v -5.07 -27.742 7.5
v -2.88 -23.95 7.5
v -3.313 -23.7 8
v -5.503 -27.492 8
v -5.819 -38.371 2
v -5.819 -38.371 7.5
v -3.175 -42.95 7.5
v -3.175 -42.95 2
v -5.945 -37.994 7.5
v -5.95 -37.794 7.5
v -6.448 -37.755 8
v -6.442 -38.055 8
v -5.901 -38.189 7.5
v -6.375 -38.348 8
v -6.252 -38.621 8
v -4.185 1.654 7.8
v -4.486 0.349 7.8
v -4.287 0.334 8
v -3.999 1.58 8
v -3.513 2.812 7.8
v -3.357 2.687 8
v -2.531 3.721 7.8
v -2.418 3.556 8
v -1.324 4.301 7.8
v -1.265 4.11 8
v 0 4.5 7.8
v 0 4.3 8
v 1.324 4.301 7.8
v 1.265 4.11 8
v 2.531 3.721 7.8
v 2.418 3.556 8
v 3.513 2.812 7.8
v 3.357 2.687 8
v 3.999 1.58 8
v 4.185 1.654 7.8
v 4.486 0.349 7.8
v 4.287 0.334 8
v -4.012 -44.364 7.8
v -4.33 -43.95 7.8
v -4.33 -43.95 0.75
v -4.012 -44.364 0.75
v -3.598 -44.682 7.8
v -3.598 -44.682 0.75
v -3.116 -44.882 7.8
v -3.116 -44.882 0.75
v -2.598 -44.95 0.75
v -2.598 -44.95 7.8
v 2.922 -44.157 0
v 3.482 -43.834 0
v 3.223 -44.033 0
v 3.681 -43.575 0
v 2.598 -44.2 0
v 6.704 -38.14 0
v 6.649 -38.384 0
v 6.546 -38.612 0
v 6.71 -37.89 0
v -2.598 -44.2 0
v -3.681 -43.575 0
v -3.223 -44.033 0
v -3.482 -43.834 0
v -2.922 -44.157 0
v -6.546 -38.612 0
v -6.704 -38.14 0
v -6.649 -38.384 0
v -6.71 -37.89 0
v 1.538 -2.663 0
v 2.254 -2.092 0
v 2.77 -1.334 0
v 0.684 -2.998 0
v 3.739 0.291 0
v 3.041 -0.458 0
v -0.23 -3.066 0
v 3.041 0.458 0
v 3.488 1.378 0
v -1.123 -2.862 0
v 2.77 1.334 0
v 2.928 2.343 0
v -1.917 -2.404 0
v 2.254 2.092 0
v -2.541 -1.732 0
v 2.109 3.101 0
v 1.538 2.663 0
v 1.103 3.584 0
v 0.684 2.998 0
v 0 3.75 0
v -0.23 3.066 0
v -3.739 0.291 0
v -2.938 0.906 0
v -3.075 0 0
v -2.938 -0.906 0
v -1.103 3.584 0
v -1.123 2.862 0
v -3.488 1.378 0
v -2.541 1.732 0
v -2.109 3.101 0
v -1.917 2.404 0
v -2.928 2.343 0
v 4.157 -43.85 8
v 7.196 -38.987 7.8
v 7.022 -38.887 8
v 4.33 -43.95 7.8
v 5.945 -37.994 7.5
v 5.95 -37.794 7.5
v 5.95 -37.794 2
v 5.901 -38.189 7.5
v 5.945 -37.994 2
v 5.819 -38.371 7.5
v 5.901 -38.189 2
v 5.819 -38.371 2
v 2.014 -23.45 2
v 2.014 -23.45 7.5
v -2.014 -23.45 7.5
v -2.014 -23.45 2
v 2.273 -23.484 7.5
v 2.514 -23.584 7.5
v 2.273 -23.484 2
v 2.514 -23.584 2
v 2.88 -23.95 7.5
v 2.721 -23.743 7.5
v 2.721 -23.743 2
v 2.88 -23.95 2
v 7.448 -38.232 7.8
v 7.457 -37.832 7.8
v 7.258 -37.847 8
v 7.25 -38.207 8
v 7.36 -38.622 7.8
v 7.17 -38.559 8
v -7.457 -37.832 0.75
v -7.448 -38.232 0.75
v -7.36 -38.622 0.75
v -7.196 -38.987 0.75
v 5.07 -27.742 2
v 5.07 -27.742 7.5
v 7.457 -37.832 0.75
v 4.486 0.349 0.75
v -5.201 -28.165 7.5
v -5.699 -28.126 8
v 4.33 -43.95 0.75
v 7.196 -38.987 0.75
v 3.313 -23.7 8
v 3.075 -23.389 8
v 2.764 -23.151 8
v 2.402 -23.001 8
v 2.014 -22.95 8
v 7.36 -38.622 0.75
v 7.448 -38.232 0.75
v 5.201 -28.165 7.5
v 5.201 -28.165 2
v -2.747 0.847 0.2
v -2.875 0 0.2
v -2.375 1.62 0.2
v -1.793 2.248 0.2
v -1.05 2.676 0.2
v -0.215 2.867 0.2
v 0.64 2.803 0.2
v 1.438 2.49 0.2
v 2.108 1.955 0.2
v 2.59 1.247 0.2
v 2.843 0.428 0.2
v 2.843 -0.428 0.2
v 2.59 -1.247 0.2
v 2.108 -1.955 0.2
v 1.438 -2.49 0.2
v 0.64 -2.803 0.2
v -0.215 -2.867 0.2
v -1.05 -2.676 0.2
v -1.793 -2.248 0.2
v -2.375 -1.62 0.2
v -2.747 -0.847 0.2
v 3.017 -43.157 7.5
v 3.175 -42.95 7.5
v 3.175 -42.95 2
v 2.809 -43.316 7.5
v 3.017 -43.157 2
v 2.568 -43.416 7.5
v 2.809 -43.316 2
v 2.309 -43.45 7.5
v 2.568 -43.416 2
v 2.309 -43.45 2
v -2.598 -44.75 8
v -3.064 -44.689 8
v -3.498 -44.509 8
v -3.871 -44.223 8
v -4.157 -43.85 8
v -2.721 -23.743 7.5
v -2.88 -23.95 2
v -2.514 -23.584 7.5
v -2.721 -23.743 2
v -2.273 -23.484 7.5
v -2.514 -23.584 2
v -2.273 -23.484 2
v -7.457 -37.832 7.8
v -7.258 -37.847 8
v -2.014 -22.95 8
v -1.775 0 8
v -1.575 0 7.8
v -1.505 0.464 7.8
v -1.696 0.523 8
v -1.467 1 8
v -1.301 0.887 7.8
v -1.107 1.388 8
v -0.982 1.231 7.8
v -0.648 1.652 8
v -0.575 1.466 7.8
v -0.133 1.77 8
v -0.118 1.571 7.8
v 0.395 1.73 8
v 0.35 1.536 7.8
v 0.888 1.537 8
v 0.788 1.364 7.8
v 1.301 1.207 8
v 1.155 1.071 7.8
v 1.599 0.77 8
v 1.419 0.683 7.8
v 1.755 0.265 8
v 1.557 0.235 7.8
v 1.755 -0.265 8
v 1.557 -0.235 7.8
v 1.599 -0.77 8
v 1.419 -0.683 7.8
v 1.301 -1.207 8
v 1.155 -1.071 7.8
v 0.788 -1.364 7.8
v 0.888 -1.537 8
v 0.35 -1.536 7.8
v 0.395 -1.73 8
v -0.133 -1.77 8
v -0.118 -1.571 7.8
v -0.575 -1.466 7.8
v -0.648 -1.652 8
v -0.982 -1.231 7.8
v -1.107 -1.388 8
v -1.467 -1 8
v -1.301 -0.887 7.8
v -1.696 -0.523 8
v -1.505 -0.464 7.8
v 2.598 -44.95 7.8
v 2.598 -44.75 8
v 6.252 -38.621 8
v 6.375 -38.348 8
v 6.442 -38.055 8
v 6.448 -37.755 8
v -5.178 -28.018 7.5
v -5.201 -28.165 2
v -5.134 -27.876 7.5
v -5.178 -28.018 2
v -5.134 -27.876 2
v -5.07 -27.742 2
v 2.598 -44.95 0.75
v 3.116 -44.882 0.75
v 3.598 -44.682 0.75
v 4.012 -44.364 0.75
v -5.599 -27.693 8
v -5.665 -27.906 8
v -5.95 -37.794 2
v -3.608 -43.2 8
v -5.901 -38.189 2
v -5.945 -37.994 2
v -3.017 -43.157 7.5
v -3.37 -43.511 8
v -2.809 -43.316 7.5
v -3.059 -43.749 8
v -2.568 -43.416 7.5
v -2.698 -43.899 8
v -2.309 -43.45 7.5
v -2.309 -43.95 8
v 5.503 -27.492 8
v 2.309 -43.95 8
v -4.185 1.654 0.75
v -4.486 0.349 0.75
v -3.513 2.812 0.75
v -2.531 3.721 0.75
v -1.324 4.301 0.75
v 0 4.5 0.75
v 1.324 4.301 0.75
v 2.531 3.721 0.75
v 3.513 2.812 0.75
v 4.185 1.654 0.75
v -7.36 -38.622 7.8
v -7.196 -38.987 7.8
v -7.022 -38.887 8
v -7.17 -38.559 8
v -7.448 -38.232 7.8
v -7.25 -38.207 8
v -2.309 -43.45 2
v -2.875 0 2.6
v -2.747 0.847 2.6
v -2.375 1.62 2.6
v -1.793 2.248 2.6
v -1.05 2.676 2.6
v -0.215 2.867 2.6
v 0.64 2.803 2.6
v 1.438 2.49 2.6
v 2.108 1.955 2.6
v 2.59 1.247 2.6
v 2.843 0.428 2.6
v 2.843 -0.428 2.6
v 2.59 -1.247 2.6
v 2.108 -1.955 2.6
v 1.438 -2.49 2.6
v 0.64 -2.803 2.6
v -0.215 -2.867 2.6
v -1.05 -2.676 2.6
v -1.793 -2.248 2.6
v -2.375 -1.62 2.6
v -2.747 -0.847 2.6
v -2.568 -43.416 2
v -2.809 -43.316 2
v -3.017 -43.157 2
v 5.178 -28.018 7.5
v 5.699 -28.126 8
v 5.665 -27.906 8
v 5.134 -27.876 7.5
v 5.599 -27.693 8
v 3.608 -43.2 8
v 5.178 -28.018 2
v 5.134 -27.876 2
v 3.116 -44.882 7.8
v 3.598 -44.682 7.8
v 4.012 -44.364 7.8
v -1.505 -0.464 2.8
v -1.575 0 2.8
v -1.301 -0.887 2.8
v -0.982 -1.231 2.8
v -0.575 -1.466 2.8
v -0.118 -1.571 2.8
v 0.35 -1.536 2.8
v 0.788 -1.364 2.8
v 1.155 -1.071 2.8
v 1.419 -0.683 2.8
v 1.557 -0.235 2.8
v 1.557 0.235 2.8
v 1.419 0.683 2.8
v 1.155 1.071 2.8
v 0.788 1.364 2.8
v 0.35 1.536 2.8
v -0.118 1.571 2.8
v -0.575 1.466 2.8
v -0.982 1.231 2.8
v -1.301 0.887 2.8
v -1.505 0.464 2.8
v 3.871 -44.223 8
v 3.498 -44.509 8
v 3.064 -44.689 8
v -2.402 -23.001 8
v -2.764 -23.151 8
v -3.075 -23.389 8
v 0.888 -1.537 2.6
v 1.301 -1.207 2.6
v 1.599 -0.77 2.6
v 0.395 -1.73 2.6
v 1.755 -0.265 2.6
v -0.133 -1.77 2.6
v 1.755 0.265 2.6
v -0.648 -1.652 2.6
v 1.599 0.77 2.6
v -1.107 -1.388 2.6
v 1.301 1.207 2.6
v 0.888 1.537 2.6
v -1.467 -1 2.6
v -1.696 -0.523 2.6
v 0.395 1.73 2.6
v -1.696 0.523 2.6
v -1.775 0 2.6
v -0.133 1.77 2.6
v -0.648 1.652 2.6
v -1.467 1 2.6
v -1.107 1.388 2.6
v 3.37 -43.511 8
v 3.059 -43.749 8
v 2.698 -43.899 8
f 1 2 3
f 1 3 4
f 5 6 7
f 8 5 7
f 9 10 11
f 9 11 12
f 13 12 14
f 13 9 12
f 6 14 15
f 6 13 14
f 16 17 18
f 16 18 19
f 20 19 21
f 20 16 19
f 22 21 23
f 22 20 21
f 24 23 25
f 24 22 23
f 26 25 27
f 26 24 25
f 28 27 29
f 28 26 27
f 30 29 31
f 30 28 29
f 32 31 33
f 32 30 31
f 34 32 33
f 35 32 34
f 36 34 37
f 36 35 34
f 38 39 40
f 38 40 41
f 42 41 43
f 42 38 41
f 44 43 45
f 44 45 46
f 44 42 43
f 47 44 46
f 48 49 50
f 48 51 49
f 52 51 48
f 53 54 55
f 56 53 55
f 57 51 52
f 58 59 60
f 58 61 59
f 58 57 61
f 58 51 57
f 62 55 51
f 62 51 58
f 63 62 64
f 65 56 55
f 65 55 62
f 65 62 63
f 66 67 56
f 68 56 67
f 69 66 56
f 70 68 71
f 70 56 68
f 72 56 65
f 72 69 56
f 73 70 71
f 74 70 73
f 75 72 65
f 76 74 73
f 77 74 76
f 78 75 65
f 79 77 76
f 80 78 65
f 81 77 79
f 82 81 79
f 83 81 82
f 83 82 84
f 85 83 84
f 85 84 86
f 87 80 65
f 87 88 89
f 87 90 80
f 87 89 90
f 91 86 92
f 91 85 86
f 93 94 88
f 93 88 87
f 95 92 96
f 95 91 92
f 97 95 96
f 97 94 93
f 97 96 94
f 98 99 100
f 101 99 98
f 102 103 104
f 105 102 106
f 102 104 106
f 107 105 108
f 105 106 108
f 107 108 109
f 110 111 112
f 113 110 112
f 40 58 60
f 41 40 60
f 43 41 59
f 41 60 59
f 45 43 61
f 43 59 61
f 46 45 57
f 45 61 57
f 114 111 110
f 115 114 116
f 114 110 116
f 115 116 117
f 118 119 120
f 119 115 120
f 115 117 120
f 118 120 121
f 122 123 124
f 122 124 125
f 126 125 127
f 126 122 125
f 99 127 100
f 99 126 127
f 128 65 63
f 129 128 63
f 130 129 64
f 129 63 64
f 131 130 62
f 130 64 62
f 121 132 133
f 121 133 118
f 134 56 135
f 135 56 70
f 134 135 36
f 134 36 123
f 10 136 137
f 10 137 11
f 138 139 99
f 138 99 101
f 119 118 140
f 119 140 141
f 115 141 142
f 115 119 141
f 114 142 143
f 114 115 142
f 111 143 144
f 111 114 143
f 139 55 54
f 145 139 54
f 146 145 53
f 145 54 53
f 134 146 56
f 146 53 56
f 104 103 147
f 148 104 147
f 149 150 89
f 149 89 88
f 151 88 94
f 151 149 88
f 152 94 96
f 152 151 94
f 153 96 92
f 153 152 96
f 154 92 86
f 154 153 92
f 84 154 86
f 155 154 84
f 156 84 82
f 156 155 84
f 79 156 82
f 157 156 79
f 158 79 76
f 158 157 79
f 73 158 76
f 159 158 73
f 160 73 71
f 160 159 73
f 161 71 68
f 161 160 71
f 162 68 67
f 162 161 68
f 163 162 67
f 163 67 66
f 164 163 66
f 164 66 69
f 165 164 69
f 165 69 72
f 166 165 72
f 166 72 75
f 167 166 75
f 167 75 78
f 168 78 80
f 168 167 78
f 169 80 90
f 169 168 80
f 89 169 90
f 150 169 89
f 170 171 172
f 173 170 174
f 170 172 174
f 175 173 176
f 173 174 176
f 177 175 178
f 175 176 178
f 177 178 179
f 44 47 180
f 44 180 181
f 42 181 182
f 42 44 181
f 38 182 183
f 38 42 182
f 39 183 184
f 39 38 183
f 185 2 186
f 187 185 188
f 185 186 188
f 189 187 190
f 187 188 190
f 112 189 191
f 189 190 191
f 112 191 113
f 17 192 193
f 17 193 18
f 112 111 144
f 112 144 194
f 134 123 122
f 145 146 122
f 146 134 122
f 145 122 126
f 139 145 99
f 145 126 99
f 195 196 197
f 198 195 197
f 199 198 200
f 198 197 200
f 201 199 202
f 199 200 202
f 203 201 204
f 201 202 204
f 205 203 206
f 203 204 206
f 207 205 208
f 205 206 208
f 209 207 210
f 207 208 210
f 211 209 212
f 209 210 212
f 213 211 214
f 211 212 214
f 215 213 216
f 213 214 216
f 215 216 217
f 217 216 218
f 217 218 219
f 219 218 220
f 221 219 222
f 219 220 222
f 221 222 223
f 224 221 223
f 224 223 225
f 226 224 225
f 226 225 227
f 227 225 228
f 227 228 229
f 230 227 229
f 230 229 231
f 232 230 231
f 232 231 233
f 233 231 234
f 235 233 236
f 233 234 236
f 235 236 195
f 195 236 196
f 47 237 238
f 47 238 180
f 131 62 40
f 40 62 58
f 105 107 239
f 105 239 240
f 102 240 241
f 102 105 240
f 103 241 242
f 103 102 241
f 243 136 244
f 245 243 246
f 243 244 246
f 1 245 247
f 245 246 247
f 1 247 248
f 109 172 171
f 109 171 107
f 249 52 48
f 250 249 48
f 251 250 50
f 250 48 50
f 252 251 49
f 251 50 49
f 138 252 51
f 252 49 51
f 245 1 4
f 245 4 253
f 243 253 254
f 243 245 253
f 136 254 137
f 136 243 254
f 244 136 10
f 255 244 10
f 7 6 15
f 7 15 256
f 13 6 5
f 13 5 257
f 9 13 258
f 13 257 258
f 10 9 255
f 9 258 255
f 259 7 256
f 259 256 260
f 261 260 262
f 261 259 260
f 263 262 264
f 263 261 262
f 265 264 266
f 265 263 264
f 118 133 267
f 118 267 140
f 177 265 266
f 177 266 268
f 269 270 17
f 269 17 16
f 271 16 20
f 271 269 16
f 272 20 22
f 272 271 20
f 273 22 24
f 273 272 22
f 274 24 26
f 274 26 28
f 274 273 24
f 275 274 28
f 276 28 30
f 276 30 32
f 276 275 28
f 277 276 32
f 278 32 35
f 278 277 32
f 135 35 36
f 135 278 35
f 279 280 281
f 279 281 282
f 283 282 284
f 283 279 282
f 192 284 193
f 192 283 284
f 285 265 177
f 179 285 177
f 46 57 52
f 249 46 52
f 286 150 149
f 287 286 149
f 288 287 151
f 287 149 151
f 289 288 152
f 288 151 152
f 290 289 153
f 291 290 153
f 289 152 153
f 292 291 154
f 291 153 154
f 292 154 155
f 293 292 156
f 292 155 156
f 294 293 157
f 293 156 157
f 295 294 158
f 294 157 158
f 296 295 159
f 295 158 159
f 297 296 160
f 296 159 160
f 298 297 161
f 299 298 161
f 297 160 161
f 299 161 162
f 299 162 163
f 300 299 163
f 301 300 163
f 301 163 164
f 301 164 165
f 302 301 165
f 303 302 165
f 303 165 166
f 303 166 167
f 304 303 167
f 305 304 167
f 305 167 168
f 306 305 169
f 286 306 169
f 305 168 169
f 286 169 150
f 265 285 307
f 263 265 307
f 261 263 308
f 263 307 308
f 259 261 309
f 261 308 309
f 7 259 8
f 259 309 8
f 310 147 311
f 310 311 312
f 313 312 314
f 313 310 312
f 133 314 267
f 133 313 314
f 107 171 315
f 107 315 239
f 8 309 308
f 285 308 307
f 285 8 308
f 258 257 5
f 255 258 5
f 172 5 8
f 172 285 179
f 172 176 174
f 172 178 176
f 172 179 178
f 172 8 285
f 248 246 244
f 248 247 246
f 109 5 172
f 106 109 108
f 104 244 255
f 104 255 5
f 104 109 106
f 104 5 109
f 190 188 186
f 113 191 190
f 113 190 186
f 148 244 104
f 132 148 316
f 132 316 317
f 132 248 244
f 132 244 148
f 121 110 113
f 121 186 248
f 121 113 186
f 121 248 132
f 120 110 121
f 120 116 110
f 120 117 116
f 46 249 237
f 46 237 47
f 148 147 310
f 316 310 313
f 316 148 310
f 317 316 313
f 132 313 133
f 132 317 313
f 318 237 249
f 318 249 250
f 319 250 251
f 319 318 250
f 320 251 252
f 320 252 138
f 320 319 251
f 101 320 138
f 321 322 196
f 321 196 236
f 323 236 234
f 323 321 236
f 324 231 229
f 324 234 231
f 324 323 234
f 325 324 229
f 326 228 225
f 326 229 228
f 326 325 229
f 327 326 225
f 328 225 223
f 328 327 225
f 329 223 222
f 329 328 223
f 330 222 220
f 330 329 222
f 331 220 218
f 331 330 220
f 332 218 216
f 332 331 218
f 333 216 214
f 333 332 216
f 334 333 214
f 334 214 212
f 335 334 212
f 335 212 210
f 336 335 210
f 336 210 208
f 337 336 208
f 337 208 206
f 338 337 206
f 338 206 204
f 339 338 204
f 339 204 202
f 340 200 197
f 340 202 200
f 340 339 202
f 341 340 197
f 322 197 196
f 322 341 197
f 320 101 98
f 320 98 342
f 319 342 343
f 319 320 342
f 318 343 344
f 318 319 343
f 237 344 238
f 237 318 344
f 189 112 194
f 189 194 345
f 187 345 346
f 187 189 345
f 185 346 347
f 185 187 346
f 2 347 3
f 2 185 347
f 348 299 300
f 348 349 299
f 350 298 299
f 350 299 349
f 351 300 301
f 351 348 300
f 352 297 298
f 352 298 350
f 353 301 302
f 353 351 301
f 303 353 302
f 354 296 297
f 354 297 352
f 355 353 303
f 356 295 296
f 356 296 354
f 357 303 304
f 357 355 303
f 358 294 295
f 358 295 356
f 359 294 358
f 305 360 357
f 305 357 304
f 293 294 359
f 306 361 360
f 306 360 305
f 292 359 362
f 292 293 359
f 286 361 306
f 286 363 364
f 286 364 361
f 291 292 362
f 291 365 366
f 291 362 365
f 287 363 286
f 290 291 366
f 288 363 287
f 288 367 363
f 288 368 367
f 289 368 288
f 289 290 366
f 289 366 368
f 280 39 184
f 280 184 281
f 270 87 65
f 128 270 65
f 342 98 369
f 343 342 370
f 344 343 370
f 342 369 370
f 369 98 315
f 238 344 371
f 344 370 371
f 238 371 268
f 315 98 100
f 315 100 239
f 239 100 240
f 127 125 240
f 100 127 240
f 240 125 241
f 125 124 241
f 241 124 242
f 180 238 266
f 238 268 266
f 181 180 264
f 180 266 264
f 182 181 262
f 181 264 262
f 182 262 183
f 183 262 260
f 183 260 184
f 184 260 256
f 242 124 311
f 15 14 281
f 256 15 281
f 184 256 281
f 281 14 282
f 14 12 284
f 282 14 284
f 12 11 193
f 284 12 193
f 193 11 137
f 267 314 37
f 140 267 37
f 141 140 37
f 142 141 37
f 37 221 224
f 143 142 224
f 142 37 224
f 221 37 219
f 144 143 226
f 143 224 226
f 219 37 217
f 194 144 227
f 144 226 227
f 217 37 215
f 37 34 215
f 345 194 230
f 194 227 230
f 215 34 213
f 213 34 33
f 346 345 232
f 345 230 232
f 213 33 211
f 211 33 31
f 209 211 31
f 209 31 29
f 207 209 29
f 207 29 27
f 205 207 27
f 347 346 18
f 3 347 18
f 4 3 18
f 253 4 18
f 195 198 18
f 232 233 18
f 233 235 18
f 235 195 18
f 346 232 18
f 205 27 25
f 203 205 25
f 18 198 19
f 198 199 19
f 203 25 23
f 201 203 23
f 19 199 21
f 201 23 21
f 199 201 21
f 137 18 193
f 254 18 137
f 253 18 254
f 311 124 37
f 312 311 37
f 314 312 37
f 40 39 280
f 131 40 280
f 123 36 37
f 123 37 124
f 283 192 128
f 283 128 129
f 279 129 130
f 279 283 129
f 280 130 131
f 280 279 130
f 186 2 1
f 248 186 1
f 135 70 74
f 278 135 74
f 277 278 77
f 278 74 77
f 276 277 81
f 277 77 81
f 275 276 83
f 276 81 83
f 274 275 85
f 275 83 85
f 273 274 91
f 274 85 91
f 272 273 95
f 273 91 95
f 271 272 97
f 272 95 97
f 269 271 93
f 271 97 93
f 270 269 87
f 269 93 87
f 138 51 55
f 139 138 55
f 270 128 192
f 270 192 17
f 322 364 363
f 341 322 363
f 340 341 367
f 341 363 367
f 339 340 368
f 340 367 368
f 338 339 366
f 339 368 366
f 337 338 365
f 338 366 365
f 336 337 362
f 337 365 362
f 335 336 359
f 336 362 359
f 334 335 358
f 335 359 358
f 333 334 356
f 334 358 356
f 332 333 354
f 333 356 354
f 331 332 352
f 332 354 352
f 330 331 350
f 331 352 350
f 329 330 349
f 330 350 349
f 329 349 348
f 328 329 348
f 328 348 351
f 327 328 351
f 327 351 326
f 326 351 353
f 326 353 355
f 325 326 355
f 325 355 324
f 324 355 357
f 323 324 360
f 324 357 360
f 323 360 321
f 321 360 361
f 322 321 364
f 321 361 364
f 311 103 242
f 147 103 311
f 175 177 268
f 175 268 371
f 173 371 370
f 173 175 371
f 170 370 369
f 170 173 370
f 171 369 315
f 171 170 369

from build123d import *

# Parameters (mm, degrees)
BOSS_EXTRUDE2_DEPTH  = 8
ROD_POCKET_DEPTH     = 6
POCKET_FILLETS_R     = 1
PROFILE_FILLETS_R    = 2
INSERT_CHAM_SIZE     = 0.5
SKETCH6_R            = 2.875
COUNTERSINK_DEPTH    = 2.6
SKETCH7_R            = 1.575
THROUGH_HOLE_DEPTH   = 47.262360557
DEBURS_SIZE          = 0.2
OUTSIDE_CHAMFER_SIZE = 0.75


with BuildPart() as part:
    # Sketch1 → Boss-Extrude2 (new body)
    with BuildSketch(Plane.XY):
        with BuildLine():
            Line((-7.505553499, -38.45), (-4.486437749, 0.349107895))
            ThreePointArc((-4.486437749, 0.349107895), (0, 4.5), (4.486437749, 0.349107895))
            Line((4.486437749, 0.349107895), (7.505553499, -38.45))
            Line((7.505553499, -38.45), (3.75277675, -44.95))
            Line((3.75277675, -44.95), (-3.75277675, -44.95))
            Line((-3.75277675, -44.95), (-7.505553499, -38.45))
        make_face()
    extrude(amount=BOSS_EXTRUDE2_DEPTH)

    # Sketch5 → Rod Pocket (cut)
    with BuildSketch(Plane.XY.offset(8)):
        Polygon((5.183091381, -27.938688806), (2.59154569, -23.45), (-2.59154569, -23.45), (-5.183091381, -27.938688806), (-5.973996897, -38.102733849), (-2.886751346, -43.45), (2.886751346, -43.45), (5.973996897, -38.102733849), align=None)
    extrude(amount=-ROD_POCKET_DEPTH, mode=Mode.SUBTRACT)

    # Pocket Fillets
    pocket_fillets_edges = [part.edges().sort_by_distance(p)[0] for p in [
        (2.59154569, -23.45, 5),
        (-2.59154569, -23.45, 5),
        (-5.183091381, -27.938688806, 5),
        (-5.973996897, -38.102733849, 5),
        (-2.886751346, -43.45, 5),
        (2.886751346, -43.45, 5),
        (5.973996897, -38.102733849, 5),
        (5.183091381, -27.938688806, 5),
    ]]
    fillet(pocket_fillets_edges, radius=POCKET_FILLETS_R)

    # Profile Fillets
    profile_fillets_edges = [part.edges().sort_by_distance(p)[0] for p in [
        (7.505553499, -38.45, 4),
        (3.75277675, -44.95, 4),
        (-3.75277675, -44.95, 4),
        (-7.505553499, -38.45, 4),
    ]]
    fillet(profile_fillets_edges, radius=PROFILE_FILLETS_R)

    # Insert Cham
    insert_cham_edges = [part.edges().sort_by_distance(p)[0] for p in [
        (-5.575313572, -32.979194827, 8),
        (-3.974970938, -25.846162818, 8),
        (-4.497205523, -40.660611541, 8),
        (0, -43.45, 8),
        (4.497205523, -40.660611541, 8),
        (5.575313572, -32.979194827, 8),
        (3.974970938, -25.846162818, 8),
        (0, -23.45, 8),
        (-5.158846312, -27.946205375, 8),
        (-5.928204033, -38.092350745, 8),
        (-2.809401077, -43.316025404, 8),
        (2.809401077, -43.316025404, 8),
        (5.928204033, -38.092350745, 8),
        (5.158846312, -27.946205375, 8),
        (2.514195421, -23.583974596, 8),
        (-2.514195421, -23.583974596, 8),
    ]]
    chamfer(insert_cham_edges, length=INSERT_CHAM_SIZE)

    # Sketch6 → Countersink (cut)
    with BuildSketch(Plane(origin=(0, 0, 0), x_dir=(-1, 0, 0), z_dir=(0, 0, -1))):
        Circle(SKETCH6_R)
    extrude(amount=-COUNTERSINK_DEPTH, mode=Mode.SUBTRACT)

    # Sketch7 → Through Hole (cut, through all)
    with BuildSketch(Plane.XY):
        with Locations(Location((0, 0, 0), (0, 0, 180))):
            Circle(SKETCH7_R)
    extrude(amount=THROUGH_HOLE_DEPTH, mode=Mode.SUBTRACT)

    # Deburs
    deburs_edges = [part.edges().sort_by_distance(p)[0] for p in [
        (5.762827928, -41.468489233, 8),
        (-5.762827928, -41.468489233, 8),
        (0, -44.95, 8),
        (-3.598076211, -44.682050808, 8),
        (3.598076211, -44.682050808, 8),
        (-7.41396777, -38.429233792, 8),
        (7.41396777, -38.429233792, 8),
        (2.875, 0, 0),
        (1.575, 0, 2.6),
        (1.575, 0, 8),
        (0, 4.5, 8),
        (-5.971944056, -18.741355754, 8),
        (5.971944056, -18.741355754, 8),
    ]]
    chamfer(deburs_edges, length=DEBURS_SIZE)

    # Outside Chamfer
    outside_chamfer_edges = [part.edges().sort_by_distance(p)[0] for p in [
        (-3.598076211, -44.682050808, 0),
        (3.598076211, -44.682050808, 0),
        (-7.41396777, -38.429233792, 0),
        (7.41396777, -38.429233792, 0),
        (-5.971944056, -18.741355754, 0),
        (0, 4.5, 0),
        (5.971944056, -18.741355754, 0),
        (5.762827928, -41.468489233, 0),
        (0, -44.95, 0),
        (-5.762827928, -41.468489233, 0),
    ]]
    chamfer(outside_chamfer_edges, length=OUTSIDE_CHAMFER_SIZE)


solid = part.part
